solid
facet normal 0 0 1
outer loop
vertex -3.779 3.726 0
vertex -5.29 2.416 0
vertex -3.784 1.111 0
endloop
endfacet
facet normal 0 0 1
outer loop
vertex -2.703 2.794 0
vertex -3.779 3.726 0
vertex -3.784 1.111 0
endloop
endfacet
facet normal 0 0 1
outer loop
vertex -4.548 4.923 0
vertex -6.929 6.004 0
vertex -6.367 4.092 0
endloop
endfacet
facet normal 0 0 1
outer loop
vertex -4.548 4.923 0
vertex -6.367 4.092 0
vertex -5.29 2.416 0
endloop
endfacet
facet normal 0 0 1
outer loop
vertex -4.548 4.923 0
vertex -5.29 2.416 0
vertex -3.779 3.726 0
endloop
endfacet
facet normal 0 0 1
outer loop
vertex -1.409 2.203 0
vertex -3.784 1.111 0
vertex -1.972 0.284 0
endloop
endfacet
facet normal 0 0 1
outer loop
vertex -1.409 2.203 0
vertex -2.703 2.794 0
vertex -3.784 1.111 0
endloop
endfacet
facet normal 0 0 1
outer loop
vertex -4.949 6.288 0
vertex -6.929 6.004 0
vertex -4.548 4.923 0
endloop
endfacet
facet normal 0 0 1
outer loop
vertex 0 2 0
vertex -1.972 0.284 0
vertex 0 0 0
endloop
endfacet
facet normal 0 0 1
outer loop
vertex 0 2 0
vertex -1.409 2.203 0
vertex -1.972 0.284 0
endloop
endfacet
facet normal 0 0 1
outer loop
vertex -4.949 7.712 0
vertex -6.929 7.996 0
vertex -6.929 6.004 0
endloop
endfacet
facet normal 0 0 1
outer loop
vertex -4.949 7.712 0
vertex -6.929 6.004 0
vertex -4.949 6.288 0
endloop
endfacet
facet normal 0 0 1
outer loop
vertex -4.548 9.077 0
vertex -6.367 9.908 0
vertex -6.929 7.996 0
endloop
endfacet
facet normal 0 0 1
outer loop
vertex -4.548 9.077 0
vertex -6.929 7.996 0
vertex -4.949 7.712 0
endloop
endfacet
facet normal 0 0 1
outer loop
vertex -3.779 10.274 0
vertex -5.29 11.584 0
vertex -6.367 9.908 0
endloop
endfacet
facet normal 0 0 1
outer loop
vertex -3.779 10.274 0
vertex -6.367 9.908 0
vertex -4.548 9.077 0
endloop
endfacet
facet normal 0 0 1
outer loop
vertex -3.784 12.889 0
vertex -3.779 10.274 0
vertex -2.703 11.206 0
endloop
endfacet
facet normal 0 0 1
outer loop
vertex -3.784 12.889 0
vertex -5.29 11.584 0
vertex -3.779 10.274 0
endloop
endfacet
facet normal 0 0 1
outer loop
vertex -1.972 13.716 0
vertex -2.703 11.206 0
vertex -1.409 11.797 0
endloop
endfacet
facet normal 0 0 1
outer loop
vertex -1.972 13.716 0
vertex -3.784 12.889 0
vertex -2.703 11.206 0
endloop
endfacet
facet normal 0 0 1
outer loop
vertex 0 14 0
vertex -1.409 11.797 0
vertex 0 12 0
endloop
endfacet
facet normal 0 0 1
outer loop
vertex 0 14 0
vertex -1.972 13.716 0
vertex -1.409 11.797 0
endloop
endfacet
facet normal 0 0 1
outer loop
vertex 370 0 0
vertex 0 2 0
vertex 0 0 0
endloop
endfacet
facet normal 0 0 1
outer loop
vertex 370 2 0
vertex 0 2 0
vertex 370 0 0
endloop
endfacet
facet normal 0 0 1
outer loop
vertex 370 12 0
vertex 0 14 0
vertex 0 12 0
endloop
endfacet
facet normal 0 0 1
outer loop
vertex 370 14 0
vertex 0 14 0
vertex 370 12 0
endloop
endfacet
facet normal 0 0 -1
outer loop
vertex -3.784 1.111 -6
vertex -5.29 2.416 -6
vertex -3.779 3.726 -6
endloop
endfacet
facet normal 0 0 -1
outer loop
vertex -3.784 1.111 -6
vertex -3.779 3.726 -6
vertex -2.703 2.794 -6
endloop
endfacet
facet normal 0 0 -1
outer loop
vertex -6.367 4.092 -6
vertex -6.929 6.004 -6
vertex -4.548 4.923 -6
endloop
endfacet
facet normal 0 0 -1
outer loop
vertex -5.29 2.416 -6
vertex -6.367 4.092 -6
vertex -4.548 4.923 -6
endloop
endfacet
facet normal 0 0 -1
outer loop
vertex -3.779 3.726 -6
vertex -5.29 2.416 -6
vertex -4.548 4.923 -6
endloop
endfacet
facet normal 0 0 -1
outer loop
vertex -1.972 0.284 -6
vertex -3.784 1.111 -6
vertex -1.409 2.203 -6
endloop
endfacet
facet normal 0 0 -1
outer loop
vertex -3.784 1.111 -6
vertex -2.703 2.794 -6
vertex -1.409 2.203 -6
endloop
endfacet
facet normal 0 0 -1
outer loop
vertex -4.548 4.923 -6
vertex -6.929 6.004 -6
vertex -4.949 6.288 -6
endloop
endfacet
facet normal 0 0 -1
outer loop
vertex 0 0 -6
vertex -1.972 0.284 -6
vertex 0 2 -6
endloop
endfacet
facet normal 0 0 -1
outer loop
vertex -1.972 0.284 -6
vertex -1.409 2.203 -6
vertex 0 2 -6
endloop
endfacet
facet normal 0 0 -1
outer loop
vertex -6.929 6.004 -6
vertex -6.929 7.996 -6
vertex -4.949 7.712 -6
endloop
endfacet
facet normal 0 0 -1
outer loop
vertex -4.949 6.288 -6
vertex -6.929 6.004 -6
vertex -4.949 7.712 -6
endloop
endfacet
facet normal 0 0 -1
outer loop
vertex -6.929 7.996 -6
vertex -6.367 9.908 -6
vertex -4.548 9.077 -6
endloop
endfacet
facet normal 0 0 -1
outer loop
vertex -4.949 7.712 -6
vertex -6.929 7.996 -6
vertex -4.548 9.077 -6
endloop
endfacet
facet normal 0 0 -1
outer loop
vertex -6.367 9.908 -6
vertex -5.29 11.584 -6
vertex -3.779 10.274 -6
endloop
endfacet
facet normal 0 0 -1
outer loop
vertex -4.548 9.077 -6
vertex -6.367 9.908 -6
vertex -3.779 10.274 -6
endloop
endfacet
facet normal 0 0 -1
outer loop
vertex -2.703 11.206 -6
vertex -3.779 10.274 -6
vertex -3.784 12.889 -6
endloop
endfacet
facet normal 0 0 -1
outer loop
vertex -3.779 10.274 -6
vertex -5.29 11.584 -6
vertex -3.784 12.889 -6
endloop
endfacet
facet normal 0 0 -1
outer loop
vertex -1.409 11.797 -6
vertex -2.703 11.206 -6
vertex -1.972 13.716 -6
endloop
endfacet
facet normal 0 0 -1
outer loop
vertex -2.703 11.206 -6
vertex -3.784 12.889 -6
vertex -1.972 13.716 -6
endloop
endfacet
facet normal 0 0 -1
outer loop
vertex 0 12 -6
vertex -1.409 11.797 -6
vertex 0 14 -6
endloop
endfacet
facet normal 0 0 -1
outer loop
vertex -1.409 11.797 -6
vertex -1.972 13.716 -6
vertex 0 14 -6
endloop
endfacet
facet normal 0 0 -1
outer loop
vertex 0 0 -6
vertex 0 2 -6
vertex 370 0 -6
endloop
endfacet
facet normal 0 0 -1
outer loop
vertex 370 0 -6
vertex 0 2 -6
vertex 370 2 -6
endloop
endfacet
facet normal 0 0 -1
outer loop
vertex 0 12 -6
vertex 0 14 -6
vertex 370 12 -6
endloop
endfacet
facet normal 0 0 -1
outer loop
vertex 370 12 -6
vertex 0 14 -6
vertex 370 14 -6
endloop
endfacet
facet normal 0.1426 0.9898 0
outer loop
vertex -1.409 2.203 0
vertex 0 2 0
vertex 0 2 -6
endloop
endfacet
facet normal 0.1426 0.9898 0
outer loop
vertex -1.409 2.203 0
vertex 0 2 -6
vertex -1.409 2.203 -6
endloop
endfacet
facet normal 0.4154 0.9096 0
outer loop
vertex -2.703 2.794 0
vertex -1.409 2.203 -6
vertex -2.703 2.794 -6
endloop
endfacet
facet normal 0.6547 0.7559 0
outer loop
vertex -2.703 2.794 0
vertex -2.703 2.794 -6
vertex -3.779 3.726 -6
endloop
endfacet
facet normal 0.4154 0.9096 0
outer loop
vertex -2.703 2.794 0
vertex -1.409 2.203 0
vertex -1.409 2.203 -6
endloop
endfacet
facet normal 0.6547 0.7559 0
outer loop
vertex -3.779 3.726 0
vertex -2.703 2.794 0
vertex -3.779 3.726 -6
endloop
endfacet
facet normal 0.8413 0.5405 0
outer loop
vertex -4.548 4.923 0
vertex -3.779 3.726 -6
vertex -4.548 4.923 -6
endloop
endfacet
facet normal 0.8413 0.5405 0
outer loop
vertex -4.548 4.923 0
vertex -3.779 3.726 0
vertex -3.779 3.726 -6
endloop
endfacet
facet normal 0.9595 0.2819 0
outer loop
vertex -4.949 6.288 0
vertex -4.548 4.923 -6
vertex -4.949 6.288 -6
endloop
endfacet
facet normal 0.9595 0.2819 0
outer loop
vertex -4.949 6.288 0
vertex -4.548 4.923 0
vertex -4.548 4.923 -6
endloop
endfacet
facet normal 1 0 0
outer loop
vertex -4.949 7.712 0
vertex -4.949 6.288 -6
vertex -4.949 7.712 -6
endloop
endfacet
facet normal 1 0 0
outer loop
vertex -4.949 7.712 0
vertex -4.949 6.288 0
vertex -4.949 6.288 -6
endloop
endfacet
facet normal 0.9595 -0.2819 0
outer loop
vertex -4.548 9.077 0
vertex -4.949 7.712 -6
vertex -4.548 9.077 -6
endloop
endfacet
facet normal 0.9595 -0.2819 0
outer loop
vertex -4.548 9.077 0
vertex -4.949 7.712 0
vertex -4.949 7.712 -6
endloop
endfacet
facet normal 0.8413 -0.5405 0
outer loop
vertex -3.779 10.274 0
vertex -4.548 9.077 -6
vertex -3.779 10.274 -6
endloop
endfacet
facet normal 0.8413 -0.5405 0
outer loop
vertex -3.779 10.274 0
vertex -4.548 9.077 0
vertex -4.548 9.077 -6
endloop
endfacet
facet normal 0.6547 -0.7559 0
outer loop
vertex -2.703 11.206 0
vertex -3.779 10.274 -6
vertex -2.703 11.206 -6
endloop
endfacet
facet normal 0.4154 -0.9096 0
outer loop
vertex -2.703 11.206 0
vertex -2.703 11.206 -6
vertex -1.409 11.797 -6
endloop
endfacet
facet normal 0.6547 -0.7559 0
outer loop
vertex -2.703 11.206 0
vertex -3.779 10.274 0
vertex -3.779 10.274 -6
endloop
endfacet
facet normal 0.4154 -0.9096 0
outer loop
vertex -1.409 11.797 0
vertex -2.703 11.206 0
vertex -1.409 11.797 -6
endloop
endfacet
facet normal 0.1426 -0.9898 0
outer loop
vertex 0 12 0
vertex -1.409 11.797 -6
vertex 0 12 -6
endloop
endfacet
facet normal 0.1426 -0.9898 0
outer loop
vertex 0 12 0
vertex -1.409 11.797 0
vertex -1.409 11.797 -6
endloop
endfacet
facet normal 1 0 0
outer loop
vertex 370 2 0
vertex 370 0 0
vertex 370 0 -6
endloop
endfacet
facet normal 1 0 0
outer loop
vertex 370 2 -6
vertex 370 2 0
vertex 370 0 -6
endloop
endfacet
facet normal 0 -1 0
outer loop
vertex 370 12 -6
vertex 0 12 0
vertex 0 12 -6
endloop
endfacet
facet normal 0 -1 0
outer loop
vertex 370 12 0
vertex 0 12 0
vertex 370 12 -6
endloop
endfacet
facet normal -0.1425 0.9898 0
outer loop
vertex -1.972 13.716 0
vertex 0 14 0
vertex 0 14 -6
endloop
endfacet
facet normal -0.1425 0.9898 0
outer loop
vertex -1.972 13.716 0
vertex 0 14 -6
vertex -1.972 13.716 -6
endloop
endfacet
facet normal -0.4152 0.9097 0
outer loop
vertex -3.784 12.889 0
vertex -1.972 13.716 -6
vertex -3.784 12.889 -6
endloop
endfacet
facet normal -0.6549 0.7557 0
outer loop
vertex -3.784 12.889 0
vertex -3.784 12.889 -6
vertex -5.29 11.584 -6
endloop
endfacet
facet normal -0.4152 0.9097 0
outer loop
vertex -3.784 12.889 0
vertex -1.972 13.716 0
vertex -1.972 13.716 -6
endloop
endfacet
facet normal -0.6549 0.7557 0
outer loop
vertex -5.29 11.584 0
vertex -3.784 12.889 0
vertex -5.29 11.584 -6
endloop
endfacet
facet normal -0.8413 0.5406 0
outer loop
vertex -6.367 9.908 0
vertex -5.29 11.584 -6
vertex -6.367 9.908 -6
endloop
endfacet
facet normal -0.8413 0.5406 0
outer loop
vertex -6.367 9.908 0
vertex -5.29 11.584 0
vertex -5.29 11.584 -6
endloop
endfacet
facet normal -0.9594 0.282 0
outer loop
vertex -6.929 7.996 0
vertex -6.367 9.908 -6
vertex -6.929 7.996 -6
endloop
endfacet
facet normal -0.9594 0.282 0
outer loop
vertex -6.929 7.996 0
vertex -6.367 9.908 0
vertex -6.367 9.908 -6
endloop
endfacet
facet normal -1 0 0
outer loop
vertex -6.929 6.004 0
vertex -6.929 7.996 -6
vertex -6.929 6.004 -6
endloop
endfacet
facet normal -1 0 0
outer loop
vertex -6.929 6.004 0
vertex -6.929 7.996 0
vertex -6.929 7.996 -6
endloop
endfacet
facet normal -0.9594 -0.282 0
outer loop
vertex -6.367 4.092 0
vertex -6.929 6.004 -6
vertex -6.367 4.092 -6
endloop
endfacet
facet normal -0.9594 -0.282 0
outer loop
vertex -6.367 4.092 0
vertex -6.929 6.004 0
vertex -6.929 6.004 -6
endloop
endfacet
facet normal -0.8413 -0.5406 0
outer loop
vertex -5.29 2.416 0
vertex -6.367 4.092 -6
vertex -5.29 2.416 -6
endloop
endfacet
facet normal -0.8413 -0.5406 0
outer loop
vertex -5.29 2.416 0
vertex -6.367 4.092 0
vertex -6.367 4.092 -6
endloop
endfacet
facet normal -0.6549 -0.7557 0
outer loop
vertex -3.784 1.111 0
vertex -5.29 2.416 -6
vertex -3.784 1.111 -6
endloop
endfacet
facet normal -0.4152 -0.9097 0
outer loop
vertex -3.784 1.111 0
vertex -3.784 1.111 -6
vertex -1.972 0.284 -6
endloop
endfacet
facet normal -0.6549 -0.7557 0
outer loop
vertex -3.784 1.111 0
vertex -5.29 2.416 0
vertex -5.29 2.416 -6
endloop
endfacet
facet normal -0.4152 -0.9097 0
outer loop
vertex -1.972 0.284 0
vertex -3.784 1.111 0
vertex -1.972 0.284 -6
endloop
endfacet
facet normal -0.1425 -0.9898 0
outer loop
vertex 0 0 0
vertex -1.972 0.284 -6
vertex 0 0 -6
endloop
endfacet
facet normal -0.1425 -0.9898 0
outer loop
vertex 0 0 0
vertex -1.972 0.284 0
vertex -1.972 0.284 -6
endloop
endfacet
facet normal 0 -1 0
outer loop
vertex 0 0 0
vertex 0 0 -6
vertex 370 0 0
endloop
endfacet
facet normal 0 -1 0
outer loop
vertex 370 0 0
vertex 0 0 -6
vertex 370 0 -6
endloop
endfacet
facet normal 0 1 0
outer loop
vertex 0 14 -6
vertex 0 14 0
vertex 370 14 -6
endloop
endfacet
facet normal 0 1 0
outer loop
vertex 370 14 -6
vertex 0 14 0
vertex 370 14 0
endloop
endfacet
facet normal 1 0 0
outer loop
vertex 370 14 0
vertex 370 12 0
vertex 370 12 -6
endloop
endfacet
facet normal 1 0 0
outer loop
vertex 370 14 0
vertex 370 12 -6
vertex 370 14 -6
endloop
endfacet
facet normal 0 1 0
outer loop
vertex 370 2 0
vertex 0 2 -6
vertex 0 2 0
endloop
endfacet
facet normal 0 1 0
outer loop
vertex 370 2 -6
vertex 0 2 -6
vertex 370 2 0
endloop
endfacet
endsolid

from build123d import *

# Parameters (mm, degrees)
SKETCH_1_W      = 370
SKETCH_1_H      = 6
EXTRUDE_1_DEPTH = 2
SKETCH_2_W      = 370
SKETCH_2_H      = 2
EXTRUDE_2_DEPTH = 6


with BuildPart() as part:
    # Эскиз1 → Бобышка-Вытянуть1 (new body)
    with BuildSketch(Plane(origin=(0, 0, 0), x_dir=(1, 0, 0), z_dir=(0, 1, 0))):
        with Locations((185, 3)):
            Rectangle(SKETCH_1_W, SKETCH_1_H)
    extrude(amount=EXTRUDE_1_DEPTH)

    # Эскиз2 → Бобышка-Вытянуть2 (add)
    with BuildSketch(Plane.XY):
        with BuildLine():
            ThreePointArc((0, 2), (-5, 7), (0, 12))
            Line((0, 12), (0, 14))
            ThreePointArc((0, 14), (-7, 7), (0, 0))
            Line((0, 0), (0, 2))
        make_face()
        with Locations((185, 13)):
            Rectangle(SKETCH_2_W, SKETCH_2_H)
    extrude(amount=-EXTRUDE_2_DEPTH)


solid = part.part
